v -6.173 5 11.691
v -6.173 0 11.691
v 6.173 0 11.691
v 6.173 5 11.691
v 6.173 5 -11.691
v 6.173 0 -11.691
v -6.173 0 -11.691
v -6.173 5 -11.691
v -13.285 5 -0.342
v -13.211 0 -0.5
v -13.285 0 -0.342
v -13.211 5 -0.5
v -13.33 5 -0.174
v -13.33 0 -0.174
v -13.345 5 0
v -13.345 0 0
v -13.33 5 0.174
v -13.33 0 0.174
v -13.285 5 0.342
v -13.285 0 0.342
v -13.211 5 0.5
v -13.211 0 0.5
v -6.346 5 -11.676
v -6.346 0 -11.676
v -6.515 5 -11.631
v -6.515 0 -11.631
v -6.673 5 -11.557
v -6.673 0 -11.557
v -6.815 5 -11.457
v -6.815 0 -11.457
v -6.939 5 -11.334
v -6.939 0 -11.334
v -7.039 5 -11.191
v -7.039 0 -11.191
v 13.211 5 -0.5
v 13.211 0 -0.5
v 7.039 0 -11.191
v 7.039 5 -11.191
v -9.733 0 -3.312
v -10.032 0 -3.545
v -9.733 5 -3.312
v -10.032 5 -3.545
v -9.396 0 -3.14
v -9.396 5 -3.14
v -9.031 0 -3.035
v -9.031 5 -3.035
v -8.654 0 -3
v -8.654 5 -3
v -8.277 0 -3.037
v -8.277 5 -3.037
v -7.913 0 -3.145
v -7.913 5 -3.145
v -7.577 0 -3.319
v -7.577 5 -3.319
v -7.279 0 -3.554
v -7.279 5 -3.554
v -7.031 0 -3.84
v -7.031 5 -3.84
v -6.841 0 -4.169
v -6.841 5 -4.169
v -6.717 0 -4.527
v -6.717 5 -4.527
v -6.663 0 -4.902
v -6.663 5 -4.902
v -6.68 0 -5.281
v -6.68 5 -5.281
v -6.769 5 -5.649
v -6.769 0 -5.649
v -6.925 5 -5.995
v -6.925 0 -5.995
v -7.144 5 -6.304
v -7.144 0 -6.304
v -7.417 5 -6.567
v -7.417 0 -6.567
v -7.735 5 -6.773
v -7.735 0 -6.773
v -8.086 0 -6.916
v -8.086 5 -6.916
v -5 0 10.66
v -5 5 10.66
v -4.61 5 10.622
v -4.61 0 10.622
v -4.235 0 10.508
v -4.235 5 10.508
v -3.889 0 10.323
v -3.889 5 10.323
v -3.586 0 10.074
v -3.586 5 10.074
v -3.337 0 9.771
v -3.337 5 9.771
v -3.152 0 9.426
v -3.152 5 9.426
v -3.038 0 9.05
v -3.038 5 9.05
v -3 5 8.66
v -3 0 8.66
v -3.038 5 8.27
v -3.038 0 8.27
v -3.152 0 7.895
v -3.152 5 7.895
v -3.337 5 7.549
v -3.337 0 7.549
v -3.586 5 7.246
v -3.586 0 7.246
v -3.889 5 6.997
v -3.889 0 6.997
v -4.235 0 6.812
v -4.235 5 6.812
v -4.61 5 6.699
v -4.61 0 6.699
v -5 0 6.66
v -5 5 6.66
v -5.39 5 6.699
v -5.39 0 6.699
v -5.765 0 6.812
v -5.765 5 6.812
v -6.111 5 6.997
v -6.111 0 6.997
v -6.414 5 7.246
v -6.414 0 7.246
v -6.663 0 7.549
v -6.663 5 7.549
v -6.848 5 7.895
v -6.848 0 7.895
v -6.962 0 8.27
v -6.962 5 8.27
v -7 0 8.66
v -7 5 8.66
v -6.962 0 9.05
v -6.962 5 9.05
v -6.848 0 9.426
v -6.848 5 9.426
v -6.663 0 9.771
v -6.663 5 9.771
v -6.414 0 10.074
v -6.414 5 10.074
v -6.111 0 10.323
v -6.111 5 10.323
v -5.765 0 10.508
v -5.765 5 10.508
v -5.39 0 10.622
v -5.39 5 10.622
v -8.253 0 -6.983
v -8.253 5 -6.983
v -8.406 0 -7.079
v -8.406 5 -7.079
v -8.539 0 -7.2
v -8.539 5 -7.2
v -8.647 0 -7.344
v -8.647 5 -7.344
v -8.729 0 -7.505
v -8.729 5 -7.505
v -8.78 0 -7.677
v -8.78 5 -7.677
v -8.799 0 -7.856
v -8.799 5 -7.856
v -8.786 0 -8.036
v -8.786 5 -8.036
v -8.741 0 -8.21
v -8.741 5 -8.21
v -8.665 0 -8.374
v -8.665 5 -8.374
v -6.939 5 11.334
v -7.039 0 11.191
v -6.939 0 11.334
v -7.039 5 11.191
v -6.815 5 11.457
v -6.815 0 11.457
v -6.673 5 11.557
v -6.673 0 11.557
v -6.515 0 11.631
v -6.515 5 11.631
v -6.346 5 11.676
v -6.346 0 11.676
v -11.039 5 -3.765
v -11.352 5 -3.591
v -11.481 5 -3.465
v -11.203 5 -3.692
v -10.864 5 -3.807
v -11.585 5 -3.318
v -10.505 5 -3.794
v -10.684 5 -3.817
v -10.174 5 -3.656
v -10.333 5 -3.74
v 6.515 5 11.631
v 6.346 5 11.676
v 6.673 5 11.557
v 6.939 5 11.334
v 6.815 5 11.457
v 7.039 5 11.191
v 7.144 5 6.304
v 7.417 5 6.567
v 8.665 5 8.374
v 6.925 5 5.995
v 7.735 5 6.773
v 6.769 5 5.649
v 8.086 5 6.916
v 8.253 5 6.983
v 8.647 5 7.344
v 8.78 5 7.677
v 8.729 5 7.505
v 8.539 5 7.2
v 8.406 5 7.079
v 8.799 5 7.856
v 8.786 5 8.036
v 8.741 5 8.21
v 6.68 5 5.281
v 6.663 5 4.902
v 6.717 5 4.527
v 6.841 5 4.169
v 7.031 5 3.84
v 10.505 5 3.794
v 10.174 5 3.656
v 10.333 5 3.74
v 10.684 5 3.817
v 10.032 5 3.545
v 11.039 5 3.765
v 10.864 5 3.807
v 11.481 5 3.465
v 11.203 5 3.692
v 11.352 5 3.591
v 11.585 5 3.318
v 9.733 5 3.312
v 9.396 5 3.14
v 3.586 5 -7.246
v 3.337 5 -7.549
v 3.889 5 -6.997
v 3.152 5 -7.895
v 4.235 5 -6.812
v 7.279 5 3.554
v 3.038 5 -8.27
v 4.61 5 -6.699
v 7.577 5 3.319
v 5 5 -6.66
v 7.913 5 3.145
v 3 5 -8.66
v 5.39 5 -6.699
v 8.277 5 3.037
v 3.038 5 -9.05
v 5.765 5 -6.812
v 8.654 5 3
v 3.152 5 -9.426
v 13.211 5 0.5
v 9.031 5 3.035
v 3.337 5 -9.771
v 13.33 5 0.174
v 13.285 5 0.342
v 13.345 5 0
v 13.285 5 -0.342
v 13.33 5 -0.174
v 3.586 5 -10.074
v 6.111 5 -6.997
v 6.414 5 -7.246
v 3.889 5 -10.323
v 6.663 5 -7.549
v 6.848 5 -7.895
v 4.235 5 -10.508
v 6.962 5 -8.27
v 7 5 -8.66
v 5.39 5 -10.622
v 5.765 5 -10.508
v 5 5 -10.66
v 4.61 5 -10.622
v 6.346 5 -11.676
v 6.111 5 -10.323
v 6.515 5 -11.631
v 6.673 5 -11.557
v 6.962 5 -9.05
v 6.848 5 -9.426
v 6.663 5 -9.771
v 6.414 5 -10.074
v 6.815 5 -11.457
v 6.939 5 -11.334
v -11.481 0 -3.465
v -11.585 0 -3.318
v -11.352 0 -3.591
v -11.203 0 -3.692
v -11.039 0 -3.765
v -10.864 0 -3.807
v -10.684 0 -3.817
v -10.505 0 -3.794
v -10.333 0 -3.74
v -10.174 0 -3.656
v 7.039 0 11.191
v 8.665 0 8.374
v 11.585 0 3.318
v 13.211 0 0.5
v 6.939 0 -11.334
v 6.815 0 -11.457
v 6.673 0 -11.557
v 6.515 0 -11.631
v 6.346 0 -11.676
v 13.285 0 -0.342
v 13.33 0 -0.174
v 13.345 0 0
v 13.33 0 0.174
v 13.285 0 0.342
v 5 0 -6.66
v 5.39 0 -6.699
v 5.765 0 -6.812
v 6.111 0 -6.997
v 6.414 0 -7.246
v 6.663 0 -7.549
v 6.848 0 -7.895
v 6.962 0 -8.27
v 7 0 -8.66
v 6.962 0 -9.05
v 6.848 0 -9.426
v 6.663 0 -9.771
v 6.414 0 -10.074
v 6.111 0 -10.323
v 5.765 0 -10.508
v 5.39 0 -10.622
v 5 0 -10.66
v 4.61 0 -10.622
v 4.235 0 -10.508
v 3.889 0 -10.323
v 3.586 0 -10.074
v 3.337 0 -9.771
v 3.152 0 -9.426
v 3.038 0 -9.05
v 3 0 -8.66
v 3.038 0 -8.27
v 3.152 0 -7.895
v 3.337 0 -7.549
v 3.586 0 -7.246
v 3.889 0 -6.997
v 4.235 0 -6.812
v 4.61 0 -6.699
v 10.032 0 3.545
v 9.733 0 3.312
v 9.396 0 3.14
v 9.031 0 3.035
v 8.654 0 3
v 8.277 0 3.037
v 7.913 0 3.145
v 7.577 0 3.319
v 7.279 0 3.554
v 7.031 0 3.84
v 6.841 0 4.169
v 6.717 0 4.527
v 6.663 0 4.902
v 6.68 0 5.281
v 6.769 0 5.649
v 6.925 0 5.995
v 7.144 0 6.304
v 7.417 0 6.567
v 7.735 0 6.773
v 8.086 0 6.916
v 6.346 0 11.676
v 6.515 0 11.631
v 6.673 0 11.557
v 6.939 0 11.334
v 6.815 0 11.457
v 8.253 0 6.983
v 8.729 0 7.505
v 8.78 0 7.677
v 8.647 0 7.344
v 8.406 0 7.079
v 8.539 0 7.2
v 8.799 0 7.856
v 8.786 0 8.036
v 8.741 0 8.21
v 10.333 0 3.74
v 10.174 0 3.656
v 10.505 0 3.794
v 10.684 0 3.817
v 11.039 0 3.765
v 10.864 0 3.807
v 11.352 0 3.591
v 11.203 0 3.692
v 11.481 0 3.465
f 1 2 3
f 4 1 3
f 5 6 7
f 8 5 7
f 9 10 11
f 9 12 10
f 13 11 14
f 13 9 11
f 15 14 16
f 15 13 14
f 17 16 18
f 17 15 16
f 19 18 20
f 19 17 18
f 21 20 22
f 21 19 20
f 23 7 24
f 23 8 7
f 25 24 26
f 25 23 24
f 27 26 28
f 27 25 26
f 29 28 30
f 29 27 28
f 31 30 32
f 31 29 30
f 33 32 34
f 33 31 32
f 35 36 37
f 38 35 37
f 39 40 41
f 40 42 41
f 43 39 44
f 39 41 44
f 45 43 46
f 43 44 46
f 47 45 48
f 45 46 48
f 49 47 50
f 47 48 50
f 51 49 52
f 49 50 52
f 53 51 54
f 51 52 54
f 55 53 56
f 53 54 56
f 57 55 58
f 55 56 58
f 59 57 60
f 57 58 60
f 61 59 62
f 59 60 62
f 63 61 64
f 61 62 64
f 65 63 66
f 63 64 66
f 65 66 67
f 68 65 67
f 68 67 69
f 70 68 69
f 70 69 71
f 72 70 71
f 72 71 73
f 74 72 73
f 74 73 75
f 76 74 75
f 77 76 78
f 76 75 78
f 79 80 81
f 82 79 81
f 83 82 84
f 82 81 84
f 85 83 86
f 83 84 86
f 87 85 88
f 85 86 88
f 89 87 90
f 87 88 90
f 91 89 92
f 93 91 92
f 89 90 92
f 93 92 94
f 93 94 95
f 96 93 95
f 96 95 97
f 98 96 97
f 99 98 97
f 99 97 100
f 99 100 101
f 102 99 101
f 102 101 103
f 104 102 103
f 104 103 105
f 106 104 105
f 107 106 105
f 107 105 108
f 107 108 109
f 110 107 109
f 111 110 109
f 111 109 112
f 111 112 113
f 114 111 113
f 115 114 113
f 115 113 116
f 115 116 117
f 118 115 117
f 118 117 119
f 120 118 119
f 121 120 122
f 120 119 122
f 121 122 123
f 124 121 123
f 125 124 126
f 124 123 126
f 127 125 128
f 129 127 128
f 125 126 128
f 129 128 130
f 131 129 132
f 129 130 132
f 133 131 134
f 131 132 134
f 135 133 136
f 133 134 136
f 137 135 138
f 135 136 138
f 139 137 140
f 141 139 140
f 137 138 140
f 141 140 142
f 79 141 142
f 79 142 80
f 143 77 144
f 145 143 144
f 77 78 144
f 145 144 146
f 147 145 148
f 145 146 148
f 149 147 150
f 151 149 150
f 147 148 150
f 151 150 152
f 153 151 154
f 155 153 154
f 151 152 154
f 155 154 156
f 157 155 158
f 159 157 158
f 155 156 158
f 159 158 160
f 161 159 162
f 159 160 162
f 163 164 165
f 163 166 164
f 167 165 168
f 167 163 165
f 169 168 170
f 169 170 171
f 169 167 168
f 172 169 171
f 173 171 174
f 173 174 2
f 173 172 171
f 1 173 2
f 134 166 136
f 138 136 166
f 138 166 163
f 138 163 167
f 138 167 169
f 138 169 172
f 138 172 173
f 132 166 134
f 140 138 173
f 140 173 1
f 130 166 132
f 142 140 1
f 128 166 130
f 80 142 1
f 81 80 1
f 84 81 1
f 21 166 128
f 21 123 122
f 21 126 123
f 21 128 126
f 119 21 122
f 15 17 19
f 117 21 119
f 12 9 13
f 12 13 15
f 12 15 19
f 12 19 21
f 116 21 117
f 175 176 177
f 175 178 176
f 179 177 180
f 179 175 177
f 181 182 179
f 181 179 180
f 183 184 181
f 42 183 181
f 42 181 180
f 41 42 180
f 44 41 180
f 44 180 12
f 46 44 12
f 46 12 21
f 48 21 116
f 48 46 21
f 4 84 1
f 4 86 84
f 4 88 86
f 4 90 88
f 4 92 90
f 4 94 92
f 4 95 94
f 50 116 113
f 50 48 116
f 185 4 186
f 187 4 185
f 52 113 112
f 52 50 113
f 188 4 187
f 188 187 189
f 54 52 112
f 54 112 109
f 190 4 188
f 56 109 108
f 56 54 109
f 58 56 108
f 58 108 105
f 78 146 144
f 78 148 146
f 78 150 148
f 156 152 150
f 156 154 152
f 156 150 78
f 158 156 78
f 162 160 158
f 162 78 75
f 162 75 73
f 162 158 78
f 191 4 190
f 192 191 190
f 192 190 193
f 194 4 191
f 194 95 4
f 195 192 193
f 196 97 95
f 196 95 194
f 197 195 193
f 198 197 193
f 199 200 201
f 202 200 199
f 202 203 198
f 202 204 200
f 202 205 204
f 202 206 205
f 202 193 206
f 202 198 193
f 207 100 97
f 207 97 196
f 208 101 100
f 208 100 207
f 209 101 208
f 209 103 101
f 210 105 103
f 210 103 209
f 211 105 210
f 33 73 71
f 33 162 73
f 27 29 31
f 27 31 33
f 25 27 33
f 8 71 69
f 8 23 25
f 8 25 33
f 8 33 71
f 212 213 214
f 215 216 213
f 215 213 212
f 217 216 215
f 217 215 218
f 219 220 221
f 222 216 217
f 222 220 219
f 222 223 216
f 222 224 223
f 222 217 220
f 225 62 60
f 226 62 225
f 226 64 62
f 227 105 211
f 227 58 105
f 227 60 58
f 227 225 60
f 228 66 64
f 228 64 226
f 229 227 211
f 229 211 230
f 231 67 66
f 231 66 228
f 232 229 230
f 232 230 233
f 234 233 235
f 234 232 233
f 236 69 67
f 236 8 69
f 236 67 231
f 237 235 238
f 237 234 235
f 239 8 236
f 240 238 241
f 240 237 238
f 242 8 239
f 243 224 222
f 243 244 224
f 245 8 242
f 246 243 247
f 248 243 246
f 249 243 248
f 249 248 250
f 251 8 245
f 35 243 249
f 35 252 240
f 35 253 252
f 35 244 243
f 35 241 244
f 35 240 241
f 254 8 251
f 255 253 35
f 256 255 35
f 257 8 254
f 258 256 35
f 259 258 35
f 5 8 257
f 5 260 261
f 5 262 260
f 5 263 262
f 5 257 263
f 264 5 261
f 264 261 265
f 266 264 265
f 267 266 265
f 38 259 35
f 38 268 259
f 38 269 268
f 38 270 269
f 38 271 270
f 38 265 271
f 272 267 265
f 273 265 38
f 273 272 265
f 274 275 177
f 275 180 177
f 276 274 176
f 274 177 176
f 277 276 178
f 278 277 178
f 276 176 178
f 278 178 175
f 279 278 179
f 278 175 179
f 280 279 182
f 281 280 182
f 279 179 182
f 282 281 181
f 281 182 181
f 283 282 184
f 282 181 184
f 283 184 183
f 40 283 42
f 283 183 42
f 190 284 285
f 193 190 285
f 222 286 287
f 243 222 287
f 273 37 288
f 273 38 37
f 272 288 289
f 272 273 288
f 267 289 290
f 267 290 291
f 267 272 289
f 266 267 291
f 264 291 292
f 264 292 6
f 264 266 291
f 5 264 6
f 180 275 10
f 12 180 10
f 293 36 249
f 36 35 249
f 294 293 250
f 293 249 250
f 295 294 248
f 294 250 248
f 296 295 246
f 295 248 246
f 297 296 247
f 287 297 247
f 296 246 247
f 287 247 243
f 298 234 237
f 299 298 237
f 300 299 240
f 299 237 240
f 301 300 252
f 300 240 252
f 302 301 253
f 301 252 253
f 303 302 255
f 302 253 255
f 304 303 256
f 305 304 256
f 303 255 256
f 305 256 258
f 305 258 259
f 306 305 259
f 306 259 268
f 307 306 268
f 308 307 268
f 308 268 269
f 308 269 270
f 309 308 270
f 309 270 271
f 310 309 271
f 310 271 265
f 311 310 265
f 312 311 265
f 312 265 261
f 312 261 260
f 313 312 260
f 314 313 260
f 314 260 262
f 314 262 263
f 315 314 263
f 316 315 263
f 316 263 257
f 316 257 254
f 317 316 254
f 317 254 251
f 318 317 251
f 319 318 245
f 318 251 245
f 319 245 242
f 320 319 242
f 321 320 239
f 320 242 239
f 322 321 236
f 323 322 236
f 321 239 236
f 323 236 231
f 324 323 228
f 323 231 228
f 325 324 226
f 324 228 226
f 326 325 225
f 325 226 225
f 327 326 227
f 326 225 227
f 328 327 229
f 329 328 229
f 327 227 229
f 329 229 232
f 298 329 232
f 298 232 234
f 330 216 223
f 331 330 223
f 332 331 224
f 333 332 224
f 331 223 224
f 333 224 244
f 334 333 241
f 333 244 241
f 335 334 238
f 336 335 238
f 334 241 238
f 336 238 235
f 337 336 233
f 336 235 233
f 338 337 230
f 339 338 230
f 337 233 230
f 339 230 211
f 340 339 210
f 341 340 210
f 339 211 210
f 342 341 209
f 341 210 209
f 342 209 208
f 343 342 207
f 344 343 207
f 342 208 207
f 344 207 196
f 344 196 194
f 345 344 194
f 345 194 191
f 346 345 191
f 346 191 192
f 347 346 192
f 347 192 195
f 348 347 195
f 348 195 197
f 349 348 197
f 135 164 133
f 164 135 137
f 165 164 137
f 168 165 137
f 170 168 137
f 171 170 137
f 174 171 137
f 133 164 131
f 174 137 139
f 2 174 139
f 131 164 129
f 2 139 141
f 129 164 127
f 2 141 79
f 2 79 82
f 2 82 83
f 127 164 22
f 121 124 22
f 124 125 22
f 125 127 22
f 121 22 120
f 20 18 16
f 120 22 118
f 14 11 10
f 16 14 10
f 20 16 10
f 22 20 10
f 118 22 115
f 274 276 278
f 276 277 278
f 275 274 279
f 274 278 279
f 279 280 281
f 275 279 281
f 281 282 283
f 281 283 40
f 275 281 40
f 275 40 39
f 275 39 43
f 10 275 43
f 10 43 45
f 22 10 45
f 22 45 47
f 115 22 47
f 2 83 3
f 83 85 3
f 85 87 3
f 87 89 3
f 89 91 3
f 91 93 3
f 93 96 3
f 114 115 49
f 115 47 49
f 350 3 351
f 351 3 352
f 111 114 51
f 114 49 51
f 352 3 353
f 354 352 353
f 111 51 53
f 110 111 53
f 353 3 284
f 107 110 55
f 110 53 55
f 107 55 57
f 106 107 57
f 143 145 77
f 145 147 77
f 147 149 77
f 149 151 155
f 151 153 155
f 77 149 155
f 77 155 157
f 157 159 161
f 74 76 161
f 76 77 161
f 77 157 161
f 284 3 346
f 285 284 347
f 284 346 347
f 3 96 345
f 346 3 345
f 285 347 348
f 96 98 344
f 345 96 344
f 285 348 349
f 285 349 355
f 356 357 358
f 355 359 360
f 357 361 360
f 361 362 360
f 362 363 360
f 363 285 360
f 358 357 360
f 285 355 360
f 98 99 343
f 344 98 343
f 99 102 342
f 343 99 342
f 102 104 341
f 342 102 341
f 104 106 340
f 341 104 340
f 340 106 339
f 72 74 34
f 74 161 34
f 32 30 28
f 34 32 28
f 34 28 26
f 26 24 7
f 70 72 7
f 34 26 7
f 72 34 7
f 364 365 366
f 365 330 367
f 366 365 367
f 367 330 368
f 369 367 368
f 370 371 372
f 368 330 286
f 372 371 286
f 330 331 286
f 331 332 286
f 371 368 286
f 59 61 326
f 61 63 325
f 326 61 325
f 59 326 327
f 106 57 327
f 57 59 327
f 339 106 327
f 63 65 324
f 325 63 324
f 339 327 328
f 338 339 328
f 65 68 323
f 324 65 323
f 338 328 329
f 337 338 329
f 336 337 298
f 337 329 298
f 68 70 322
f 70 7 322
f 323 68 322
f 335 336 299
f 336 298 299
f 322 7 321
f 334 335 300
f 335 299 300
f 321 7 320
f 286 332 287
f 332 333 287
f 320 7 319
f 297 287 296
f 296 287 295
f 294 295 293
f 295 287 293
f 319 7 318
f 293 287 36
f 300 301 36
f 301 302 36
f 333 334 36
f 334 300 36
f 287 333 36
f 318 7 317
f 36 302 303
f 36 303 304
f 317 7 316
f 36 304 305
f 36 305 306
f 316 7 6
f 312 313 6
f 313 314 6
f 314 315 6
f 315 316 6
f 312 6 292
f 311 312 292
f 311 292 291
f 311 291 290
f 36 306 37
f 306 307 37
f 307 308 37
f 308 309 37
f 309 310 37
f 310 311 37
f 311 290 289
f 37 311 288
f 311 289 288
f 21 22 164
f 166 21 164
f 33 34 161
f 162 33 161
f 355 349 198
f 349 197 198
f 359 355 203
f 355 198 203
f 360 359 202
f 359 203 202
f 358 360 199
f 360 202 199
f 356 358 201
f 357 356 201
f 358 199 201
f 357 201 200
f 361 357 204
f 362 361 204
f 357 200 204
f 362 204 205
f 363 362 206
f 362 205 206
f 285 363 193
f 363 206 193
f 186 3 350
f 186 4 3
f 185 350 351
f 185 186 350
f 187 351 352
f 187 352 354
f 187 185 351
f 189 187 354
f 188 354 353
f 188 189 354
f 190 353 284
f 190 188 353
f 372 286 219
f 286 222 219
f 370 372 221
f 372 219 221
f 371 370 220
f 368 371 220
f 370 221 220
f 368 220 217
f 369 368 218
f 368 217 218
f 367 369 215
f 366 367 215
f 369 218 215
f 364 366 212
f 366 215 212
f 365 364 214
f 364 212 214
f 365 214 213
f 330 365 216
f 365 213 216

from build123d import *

# Parameters (mm, degrees)
EXTRUDE_1_DEPTH     = 5
FILLET_1_R          = 1
SKETCH_2_R          = 2
CUT_EXTRUDE_1_DEPTH = 10
FILLET_2_R          = 1


with BuildPart() as part:
    # Эскиз1 → Бобышка-Вытянуть1 (new body)
    with BuildSketch(Plane(origin=(0, 0, 0), x_dir=(1, 0, 0), z_dir=(0, 1, 0))):
        Polygon((13.5, 0), (6.75, 11.691342951), (-6.75, 11.691342951), (-13.5, 0), (-6.75, -11.691342951), (6.75, -11.691342951), align=None)
    extrude(amount=EXTRUDE_1_DEPTH)

    # Скругление1
    fillet_1_edges = [part.edges().sort_by_distance(p)[0] for p in [
        (6.75, 2.5, 11.691342951),
        (-6.75, 2.5, 11.691342951),
        (-13.5, 2.5, 0),
        (-6.75, 2.5, -11.691342951),
        (6.75, 2.5, -11.691342951),
        (13.5, 2.5, 0),
    ]]
    fillet(fillet_1_edges, radius=FILLET_1_R)

    # Эскиз2 → Вырез-Вытянуть1 (cut)
    with BuildSketch(Plane(origin=(0, 5, 0), x_dir=(1, 0, 0), z_dir=(0, 1, 0))):
        with Locations(Location((5, 8.660254038, 0), (0, 0, 270))):
            Circle(SKETCH_2_R)
        with Locations((8.660254038, -5)):
            Circle(SKETCH_2_R)
        with Locations(Location((-5, -8.660254038, 0), (0, 0, 270))):
            Circle(SKETCH_2_R)
        with Locations((-8.660254038, 5)):
            Circle(SKETCH_2_R)
    extrude(amount=-CUT_EXTRUDE_1_DEPTH, mode=Mode.SUBTRACT)

    # Скругление2
    fillet_2_edges = [part.edges().sort_by_distance(p)[0] for p in [
        (-9.591296191, 2.5, -6.770073588),
        (-10.658703809, 2.5, -4.921269363),
        (9.591296191, 2.5, 6.770073588),
        (10.658703809, 2.5, 4.921269363),
    ]]
    fillet(fillet_2_edges, radius=FILLET_2_R)


solid = part.part
